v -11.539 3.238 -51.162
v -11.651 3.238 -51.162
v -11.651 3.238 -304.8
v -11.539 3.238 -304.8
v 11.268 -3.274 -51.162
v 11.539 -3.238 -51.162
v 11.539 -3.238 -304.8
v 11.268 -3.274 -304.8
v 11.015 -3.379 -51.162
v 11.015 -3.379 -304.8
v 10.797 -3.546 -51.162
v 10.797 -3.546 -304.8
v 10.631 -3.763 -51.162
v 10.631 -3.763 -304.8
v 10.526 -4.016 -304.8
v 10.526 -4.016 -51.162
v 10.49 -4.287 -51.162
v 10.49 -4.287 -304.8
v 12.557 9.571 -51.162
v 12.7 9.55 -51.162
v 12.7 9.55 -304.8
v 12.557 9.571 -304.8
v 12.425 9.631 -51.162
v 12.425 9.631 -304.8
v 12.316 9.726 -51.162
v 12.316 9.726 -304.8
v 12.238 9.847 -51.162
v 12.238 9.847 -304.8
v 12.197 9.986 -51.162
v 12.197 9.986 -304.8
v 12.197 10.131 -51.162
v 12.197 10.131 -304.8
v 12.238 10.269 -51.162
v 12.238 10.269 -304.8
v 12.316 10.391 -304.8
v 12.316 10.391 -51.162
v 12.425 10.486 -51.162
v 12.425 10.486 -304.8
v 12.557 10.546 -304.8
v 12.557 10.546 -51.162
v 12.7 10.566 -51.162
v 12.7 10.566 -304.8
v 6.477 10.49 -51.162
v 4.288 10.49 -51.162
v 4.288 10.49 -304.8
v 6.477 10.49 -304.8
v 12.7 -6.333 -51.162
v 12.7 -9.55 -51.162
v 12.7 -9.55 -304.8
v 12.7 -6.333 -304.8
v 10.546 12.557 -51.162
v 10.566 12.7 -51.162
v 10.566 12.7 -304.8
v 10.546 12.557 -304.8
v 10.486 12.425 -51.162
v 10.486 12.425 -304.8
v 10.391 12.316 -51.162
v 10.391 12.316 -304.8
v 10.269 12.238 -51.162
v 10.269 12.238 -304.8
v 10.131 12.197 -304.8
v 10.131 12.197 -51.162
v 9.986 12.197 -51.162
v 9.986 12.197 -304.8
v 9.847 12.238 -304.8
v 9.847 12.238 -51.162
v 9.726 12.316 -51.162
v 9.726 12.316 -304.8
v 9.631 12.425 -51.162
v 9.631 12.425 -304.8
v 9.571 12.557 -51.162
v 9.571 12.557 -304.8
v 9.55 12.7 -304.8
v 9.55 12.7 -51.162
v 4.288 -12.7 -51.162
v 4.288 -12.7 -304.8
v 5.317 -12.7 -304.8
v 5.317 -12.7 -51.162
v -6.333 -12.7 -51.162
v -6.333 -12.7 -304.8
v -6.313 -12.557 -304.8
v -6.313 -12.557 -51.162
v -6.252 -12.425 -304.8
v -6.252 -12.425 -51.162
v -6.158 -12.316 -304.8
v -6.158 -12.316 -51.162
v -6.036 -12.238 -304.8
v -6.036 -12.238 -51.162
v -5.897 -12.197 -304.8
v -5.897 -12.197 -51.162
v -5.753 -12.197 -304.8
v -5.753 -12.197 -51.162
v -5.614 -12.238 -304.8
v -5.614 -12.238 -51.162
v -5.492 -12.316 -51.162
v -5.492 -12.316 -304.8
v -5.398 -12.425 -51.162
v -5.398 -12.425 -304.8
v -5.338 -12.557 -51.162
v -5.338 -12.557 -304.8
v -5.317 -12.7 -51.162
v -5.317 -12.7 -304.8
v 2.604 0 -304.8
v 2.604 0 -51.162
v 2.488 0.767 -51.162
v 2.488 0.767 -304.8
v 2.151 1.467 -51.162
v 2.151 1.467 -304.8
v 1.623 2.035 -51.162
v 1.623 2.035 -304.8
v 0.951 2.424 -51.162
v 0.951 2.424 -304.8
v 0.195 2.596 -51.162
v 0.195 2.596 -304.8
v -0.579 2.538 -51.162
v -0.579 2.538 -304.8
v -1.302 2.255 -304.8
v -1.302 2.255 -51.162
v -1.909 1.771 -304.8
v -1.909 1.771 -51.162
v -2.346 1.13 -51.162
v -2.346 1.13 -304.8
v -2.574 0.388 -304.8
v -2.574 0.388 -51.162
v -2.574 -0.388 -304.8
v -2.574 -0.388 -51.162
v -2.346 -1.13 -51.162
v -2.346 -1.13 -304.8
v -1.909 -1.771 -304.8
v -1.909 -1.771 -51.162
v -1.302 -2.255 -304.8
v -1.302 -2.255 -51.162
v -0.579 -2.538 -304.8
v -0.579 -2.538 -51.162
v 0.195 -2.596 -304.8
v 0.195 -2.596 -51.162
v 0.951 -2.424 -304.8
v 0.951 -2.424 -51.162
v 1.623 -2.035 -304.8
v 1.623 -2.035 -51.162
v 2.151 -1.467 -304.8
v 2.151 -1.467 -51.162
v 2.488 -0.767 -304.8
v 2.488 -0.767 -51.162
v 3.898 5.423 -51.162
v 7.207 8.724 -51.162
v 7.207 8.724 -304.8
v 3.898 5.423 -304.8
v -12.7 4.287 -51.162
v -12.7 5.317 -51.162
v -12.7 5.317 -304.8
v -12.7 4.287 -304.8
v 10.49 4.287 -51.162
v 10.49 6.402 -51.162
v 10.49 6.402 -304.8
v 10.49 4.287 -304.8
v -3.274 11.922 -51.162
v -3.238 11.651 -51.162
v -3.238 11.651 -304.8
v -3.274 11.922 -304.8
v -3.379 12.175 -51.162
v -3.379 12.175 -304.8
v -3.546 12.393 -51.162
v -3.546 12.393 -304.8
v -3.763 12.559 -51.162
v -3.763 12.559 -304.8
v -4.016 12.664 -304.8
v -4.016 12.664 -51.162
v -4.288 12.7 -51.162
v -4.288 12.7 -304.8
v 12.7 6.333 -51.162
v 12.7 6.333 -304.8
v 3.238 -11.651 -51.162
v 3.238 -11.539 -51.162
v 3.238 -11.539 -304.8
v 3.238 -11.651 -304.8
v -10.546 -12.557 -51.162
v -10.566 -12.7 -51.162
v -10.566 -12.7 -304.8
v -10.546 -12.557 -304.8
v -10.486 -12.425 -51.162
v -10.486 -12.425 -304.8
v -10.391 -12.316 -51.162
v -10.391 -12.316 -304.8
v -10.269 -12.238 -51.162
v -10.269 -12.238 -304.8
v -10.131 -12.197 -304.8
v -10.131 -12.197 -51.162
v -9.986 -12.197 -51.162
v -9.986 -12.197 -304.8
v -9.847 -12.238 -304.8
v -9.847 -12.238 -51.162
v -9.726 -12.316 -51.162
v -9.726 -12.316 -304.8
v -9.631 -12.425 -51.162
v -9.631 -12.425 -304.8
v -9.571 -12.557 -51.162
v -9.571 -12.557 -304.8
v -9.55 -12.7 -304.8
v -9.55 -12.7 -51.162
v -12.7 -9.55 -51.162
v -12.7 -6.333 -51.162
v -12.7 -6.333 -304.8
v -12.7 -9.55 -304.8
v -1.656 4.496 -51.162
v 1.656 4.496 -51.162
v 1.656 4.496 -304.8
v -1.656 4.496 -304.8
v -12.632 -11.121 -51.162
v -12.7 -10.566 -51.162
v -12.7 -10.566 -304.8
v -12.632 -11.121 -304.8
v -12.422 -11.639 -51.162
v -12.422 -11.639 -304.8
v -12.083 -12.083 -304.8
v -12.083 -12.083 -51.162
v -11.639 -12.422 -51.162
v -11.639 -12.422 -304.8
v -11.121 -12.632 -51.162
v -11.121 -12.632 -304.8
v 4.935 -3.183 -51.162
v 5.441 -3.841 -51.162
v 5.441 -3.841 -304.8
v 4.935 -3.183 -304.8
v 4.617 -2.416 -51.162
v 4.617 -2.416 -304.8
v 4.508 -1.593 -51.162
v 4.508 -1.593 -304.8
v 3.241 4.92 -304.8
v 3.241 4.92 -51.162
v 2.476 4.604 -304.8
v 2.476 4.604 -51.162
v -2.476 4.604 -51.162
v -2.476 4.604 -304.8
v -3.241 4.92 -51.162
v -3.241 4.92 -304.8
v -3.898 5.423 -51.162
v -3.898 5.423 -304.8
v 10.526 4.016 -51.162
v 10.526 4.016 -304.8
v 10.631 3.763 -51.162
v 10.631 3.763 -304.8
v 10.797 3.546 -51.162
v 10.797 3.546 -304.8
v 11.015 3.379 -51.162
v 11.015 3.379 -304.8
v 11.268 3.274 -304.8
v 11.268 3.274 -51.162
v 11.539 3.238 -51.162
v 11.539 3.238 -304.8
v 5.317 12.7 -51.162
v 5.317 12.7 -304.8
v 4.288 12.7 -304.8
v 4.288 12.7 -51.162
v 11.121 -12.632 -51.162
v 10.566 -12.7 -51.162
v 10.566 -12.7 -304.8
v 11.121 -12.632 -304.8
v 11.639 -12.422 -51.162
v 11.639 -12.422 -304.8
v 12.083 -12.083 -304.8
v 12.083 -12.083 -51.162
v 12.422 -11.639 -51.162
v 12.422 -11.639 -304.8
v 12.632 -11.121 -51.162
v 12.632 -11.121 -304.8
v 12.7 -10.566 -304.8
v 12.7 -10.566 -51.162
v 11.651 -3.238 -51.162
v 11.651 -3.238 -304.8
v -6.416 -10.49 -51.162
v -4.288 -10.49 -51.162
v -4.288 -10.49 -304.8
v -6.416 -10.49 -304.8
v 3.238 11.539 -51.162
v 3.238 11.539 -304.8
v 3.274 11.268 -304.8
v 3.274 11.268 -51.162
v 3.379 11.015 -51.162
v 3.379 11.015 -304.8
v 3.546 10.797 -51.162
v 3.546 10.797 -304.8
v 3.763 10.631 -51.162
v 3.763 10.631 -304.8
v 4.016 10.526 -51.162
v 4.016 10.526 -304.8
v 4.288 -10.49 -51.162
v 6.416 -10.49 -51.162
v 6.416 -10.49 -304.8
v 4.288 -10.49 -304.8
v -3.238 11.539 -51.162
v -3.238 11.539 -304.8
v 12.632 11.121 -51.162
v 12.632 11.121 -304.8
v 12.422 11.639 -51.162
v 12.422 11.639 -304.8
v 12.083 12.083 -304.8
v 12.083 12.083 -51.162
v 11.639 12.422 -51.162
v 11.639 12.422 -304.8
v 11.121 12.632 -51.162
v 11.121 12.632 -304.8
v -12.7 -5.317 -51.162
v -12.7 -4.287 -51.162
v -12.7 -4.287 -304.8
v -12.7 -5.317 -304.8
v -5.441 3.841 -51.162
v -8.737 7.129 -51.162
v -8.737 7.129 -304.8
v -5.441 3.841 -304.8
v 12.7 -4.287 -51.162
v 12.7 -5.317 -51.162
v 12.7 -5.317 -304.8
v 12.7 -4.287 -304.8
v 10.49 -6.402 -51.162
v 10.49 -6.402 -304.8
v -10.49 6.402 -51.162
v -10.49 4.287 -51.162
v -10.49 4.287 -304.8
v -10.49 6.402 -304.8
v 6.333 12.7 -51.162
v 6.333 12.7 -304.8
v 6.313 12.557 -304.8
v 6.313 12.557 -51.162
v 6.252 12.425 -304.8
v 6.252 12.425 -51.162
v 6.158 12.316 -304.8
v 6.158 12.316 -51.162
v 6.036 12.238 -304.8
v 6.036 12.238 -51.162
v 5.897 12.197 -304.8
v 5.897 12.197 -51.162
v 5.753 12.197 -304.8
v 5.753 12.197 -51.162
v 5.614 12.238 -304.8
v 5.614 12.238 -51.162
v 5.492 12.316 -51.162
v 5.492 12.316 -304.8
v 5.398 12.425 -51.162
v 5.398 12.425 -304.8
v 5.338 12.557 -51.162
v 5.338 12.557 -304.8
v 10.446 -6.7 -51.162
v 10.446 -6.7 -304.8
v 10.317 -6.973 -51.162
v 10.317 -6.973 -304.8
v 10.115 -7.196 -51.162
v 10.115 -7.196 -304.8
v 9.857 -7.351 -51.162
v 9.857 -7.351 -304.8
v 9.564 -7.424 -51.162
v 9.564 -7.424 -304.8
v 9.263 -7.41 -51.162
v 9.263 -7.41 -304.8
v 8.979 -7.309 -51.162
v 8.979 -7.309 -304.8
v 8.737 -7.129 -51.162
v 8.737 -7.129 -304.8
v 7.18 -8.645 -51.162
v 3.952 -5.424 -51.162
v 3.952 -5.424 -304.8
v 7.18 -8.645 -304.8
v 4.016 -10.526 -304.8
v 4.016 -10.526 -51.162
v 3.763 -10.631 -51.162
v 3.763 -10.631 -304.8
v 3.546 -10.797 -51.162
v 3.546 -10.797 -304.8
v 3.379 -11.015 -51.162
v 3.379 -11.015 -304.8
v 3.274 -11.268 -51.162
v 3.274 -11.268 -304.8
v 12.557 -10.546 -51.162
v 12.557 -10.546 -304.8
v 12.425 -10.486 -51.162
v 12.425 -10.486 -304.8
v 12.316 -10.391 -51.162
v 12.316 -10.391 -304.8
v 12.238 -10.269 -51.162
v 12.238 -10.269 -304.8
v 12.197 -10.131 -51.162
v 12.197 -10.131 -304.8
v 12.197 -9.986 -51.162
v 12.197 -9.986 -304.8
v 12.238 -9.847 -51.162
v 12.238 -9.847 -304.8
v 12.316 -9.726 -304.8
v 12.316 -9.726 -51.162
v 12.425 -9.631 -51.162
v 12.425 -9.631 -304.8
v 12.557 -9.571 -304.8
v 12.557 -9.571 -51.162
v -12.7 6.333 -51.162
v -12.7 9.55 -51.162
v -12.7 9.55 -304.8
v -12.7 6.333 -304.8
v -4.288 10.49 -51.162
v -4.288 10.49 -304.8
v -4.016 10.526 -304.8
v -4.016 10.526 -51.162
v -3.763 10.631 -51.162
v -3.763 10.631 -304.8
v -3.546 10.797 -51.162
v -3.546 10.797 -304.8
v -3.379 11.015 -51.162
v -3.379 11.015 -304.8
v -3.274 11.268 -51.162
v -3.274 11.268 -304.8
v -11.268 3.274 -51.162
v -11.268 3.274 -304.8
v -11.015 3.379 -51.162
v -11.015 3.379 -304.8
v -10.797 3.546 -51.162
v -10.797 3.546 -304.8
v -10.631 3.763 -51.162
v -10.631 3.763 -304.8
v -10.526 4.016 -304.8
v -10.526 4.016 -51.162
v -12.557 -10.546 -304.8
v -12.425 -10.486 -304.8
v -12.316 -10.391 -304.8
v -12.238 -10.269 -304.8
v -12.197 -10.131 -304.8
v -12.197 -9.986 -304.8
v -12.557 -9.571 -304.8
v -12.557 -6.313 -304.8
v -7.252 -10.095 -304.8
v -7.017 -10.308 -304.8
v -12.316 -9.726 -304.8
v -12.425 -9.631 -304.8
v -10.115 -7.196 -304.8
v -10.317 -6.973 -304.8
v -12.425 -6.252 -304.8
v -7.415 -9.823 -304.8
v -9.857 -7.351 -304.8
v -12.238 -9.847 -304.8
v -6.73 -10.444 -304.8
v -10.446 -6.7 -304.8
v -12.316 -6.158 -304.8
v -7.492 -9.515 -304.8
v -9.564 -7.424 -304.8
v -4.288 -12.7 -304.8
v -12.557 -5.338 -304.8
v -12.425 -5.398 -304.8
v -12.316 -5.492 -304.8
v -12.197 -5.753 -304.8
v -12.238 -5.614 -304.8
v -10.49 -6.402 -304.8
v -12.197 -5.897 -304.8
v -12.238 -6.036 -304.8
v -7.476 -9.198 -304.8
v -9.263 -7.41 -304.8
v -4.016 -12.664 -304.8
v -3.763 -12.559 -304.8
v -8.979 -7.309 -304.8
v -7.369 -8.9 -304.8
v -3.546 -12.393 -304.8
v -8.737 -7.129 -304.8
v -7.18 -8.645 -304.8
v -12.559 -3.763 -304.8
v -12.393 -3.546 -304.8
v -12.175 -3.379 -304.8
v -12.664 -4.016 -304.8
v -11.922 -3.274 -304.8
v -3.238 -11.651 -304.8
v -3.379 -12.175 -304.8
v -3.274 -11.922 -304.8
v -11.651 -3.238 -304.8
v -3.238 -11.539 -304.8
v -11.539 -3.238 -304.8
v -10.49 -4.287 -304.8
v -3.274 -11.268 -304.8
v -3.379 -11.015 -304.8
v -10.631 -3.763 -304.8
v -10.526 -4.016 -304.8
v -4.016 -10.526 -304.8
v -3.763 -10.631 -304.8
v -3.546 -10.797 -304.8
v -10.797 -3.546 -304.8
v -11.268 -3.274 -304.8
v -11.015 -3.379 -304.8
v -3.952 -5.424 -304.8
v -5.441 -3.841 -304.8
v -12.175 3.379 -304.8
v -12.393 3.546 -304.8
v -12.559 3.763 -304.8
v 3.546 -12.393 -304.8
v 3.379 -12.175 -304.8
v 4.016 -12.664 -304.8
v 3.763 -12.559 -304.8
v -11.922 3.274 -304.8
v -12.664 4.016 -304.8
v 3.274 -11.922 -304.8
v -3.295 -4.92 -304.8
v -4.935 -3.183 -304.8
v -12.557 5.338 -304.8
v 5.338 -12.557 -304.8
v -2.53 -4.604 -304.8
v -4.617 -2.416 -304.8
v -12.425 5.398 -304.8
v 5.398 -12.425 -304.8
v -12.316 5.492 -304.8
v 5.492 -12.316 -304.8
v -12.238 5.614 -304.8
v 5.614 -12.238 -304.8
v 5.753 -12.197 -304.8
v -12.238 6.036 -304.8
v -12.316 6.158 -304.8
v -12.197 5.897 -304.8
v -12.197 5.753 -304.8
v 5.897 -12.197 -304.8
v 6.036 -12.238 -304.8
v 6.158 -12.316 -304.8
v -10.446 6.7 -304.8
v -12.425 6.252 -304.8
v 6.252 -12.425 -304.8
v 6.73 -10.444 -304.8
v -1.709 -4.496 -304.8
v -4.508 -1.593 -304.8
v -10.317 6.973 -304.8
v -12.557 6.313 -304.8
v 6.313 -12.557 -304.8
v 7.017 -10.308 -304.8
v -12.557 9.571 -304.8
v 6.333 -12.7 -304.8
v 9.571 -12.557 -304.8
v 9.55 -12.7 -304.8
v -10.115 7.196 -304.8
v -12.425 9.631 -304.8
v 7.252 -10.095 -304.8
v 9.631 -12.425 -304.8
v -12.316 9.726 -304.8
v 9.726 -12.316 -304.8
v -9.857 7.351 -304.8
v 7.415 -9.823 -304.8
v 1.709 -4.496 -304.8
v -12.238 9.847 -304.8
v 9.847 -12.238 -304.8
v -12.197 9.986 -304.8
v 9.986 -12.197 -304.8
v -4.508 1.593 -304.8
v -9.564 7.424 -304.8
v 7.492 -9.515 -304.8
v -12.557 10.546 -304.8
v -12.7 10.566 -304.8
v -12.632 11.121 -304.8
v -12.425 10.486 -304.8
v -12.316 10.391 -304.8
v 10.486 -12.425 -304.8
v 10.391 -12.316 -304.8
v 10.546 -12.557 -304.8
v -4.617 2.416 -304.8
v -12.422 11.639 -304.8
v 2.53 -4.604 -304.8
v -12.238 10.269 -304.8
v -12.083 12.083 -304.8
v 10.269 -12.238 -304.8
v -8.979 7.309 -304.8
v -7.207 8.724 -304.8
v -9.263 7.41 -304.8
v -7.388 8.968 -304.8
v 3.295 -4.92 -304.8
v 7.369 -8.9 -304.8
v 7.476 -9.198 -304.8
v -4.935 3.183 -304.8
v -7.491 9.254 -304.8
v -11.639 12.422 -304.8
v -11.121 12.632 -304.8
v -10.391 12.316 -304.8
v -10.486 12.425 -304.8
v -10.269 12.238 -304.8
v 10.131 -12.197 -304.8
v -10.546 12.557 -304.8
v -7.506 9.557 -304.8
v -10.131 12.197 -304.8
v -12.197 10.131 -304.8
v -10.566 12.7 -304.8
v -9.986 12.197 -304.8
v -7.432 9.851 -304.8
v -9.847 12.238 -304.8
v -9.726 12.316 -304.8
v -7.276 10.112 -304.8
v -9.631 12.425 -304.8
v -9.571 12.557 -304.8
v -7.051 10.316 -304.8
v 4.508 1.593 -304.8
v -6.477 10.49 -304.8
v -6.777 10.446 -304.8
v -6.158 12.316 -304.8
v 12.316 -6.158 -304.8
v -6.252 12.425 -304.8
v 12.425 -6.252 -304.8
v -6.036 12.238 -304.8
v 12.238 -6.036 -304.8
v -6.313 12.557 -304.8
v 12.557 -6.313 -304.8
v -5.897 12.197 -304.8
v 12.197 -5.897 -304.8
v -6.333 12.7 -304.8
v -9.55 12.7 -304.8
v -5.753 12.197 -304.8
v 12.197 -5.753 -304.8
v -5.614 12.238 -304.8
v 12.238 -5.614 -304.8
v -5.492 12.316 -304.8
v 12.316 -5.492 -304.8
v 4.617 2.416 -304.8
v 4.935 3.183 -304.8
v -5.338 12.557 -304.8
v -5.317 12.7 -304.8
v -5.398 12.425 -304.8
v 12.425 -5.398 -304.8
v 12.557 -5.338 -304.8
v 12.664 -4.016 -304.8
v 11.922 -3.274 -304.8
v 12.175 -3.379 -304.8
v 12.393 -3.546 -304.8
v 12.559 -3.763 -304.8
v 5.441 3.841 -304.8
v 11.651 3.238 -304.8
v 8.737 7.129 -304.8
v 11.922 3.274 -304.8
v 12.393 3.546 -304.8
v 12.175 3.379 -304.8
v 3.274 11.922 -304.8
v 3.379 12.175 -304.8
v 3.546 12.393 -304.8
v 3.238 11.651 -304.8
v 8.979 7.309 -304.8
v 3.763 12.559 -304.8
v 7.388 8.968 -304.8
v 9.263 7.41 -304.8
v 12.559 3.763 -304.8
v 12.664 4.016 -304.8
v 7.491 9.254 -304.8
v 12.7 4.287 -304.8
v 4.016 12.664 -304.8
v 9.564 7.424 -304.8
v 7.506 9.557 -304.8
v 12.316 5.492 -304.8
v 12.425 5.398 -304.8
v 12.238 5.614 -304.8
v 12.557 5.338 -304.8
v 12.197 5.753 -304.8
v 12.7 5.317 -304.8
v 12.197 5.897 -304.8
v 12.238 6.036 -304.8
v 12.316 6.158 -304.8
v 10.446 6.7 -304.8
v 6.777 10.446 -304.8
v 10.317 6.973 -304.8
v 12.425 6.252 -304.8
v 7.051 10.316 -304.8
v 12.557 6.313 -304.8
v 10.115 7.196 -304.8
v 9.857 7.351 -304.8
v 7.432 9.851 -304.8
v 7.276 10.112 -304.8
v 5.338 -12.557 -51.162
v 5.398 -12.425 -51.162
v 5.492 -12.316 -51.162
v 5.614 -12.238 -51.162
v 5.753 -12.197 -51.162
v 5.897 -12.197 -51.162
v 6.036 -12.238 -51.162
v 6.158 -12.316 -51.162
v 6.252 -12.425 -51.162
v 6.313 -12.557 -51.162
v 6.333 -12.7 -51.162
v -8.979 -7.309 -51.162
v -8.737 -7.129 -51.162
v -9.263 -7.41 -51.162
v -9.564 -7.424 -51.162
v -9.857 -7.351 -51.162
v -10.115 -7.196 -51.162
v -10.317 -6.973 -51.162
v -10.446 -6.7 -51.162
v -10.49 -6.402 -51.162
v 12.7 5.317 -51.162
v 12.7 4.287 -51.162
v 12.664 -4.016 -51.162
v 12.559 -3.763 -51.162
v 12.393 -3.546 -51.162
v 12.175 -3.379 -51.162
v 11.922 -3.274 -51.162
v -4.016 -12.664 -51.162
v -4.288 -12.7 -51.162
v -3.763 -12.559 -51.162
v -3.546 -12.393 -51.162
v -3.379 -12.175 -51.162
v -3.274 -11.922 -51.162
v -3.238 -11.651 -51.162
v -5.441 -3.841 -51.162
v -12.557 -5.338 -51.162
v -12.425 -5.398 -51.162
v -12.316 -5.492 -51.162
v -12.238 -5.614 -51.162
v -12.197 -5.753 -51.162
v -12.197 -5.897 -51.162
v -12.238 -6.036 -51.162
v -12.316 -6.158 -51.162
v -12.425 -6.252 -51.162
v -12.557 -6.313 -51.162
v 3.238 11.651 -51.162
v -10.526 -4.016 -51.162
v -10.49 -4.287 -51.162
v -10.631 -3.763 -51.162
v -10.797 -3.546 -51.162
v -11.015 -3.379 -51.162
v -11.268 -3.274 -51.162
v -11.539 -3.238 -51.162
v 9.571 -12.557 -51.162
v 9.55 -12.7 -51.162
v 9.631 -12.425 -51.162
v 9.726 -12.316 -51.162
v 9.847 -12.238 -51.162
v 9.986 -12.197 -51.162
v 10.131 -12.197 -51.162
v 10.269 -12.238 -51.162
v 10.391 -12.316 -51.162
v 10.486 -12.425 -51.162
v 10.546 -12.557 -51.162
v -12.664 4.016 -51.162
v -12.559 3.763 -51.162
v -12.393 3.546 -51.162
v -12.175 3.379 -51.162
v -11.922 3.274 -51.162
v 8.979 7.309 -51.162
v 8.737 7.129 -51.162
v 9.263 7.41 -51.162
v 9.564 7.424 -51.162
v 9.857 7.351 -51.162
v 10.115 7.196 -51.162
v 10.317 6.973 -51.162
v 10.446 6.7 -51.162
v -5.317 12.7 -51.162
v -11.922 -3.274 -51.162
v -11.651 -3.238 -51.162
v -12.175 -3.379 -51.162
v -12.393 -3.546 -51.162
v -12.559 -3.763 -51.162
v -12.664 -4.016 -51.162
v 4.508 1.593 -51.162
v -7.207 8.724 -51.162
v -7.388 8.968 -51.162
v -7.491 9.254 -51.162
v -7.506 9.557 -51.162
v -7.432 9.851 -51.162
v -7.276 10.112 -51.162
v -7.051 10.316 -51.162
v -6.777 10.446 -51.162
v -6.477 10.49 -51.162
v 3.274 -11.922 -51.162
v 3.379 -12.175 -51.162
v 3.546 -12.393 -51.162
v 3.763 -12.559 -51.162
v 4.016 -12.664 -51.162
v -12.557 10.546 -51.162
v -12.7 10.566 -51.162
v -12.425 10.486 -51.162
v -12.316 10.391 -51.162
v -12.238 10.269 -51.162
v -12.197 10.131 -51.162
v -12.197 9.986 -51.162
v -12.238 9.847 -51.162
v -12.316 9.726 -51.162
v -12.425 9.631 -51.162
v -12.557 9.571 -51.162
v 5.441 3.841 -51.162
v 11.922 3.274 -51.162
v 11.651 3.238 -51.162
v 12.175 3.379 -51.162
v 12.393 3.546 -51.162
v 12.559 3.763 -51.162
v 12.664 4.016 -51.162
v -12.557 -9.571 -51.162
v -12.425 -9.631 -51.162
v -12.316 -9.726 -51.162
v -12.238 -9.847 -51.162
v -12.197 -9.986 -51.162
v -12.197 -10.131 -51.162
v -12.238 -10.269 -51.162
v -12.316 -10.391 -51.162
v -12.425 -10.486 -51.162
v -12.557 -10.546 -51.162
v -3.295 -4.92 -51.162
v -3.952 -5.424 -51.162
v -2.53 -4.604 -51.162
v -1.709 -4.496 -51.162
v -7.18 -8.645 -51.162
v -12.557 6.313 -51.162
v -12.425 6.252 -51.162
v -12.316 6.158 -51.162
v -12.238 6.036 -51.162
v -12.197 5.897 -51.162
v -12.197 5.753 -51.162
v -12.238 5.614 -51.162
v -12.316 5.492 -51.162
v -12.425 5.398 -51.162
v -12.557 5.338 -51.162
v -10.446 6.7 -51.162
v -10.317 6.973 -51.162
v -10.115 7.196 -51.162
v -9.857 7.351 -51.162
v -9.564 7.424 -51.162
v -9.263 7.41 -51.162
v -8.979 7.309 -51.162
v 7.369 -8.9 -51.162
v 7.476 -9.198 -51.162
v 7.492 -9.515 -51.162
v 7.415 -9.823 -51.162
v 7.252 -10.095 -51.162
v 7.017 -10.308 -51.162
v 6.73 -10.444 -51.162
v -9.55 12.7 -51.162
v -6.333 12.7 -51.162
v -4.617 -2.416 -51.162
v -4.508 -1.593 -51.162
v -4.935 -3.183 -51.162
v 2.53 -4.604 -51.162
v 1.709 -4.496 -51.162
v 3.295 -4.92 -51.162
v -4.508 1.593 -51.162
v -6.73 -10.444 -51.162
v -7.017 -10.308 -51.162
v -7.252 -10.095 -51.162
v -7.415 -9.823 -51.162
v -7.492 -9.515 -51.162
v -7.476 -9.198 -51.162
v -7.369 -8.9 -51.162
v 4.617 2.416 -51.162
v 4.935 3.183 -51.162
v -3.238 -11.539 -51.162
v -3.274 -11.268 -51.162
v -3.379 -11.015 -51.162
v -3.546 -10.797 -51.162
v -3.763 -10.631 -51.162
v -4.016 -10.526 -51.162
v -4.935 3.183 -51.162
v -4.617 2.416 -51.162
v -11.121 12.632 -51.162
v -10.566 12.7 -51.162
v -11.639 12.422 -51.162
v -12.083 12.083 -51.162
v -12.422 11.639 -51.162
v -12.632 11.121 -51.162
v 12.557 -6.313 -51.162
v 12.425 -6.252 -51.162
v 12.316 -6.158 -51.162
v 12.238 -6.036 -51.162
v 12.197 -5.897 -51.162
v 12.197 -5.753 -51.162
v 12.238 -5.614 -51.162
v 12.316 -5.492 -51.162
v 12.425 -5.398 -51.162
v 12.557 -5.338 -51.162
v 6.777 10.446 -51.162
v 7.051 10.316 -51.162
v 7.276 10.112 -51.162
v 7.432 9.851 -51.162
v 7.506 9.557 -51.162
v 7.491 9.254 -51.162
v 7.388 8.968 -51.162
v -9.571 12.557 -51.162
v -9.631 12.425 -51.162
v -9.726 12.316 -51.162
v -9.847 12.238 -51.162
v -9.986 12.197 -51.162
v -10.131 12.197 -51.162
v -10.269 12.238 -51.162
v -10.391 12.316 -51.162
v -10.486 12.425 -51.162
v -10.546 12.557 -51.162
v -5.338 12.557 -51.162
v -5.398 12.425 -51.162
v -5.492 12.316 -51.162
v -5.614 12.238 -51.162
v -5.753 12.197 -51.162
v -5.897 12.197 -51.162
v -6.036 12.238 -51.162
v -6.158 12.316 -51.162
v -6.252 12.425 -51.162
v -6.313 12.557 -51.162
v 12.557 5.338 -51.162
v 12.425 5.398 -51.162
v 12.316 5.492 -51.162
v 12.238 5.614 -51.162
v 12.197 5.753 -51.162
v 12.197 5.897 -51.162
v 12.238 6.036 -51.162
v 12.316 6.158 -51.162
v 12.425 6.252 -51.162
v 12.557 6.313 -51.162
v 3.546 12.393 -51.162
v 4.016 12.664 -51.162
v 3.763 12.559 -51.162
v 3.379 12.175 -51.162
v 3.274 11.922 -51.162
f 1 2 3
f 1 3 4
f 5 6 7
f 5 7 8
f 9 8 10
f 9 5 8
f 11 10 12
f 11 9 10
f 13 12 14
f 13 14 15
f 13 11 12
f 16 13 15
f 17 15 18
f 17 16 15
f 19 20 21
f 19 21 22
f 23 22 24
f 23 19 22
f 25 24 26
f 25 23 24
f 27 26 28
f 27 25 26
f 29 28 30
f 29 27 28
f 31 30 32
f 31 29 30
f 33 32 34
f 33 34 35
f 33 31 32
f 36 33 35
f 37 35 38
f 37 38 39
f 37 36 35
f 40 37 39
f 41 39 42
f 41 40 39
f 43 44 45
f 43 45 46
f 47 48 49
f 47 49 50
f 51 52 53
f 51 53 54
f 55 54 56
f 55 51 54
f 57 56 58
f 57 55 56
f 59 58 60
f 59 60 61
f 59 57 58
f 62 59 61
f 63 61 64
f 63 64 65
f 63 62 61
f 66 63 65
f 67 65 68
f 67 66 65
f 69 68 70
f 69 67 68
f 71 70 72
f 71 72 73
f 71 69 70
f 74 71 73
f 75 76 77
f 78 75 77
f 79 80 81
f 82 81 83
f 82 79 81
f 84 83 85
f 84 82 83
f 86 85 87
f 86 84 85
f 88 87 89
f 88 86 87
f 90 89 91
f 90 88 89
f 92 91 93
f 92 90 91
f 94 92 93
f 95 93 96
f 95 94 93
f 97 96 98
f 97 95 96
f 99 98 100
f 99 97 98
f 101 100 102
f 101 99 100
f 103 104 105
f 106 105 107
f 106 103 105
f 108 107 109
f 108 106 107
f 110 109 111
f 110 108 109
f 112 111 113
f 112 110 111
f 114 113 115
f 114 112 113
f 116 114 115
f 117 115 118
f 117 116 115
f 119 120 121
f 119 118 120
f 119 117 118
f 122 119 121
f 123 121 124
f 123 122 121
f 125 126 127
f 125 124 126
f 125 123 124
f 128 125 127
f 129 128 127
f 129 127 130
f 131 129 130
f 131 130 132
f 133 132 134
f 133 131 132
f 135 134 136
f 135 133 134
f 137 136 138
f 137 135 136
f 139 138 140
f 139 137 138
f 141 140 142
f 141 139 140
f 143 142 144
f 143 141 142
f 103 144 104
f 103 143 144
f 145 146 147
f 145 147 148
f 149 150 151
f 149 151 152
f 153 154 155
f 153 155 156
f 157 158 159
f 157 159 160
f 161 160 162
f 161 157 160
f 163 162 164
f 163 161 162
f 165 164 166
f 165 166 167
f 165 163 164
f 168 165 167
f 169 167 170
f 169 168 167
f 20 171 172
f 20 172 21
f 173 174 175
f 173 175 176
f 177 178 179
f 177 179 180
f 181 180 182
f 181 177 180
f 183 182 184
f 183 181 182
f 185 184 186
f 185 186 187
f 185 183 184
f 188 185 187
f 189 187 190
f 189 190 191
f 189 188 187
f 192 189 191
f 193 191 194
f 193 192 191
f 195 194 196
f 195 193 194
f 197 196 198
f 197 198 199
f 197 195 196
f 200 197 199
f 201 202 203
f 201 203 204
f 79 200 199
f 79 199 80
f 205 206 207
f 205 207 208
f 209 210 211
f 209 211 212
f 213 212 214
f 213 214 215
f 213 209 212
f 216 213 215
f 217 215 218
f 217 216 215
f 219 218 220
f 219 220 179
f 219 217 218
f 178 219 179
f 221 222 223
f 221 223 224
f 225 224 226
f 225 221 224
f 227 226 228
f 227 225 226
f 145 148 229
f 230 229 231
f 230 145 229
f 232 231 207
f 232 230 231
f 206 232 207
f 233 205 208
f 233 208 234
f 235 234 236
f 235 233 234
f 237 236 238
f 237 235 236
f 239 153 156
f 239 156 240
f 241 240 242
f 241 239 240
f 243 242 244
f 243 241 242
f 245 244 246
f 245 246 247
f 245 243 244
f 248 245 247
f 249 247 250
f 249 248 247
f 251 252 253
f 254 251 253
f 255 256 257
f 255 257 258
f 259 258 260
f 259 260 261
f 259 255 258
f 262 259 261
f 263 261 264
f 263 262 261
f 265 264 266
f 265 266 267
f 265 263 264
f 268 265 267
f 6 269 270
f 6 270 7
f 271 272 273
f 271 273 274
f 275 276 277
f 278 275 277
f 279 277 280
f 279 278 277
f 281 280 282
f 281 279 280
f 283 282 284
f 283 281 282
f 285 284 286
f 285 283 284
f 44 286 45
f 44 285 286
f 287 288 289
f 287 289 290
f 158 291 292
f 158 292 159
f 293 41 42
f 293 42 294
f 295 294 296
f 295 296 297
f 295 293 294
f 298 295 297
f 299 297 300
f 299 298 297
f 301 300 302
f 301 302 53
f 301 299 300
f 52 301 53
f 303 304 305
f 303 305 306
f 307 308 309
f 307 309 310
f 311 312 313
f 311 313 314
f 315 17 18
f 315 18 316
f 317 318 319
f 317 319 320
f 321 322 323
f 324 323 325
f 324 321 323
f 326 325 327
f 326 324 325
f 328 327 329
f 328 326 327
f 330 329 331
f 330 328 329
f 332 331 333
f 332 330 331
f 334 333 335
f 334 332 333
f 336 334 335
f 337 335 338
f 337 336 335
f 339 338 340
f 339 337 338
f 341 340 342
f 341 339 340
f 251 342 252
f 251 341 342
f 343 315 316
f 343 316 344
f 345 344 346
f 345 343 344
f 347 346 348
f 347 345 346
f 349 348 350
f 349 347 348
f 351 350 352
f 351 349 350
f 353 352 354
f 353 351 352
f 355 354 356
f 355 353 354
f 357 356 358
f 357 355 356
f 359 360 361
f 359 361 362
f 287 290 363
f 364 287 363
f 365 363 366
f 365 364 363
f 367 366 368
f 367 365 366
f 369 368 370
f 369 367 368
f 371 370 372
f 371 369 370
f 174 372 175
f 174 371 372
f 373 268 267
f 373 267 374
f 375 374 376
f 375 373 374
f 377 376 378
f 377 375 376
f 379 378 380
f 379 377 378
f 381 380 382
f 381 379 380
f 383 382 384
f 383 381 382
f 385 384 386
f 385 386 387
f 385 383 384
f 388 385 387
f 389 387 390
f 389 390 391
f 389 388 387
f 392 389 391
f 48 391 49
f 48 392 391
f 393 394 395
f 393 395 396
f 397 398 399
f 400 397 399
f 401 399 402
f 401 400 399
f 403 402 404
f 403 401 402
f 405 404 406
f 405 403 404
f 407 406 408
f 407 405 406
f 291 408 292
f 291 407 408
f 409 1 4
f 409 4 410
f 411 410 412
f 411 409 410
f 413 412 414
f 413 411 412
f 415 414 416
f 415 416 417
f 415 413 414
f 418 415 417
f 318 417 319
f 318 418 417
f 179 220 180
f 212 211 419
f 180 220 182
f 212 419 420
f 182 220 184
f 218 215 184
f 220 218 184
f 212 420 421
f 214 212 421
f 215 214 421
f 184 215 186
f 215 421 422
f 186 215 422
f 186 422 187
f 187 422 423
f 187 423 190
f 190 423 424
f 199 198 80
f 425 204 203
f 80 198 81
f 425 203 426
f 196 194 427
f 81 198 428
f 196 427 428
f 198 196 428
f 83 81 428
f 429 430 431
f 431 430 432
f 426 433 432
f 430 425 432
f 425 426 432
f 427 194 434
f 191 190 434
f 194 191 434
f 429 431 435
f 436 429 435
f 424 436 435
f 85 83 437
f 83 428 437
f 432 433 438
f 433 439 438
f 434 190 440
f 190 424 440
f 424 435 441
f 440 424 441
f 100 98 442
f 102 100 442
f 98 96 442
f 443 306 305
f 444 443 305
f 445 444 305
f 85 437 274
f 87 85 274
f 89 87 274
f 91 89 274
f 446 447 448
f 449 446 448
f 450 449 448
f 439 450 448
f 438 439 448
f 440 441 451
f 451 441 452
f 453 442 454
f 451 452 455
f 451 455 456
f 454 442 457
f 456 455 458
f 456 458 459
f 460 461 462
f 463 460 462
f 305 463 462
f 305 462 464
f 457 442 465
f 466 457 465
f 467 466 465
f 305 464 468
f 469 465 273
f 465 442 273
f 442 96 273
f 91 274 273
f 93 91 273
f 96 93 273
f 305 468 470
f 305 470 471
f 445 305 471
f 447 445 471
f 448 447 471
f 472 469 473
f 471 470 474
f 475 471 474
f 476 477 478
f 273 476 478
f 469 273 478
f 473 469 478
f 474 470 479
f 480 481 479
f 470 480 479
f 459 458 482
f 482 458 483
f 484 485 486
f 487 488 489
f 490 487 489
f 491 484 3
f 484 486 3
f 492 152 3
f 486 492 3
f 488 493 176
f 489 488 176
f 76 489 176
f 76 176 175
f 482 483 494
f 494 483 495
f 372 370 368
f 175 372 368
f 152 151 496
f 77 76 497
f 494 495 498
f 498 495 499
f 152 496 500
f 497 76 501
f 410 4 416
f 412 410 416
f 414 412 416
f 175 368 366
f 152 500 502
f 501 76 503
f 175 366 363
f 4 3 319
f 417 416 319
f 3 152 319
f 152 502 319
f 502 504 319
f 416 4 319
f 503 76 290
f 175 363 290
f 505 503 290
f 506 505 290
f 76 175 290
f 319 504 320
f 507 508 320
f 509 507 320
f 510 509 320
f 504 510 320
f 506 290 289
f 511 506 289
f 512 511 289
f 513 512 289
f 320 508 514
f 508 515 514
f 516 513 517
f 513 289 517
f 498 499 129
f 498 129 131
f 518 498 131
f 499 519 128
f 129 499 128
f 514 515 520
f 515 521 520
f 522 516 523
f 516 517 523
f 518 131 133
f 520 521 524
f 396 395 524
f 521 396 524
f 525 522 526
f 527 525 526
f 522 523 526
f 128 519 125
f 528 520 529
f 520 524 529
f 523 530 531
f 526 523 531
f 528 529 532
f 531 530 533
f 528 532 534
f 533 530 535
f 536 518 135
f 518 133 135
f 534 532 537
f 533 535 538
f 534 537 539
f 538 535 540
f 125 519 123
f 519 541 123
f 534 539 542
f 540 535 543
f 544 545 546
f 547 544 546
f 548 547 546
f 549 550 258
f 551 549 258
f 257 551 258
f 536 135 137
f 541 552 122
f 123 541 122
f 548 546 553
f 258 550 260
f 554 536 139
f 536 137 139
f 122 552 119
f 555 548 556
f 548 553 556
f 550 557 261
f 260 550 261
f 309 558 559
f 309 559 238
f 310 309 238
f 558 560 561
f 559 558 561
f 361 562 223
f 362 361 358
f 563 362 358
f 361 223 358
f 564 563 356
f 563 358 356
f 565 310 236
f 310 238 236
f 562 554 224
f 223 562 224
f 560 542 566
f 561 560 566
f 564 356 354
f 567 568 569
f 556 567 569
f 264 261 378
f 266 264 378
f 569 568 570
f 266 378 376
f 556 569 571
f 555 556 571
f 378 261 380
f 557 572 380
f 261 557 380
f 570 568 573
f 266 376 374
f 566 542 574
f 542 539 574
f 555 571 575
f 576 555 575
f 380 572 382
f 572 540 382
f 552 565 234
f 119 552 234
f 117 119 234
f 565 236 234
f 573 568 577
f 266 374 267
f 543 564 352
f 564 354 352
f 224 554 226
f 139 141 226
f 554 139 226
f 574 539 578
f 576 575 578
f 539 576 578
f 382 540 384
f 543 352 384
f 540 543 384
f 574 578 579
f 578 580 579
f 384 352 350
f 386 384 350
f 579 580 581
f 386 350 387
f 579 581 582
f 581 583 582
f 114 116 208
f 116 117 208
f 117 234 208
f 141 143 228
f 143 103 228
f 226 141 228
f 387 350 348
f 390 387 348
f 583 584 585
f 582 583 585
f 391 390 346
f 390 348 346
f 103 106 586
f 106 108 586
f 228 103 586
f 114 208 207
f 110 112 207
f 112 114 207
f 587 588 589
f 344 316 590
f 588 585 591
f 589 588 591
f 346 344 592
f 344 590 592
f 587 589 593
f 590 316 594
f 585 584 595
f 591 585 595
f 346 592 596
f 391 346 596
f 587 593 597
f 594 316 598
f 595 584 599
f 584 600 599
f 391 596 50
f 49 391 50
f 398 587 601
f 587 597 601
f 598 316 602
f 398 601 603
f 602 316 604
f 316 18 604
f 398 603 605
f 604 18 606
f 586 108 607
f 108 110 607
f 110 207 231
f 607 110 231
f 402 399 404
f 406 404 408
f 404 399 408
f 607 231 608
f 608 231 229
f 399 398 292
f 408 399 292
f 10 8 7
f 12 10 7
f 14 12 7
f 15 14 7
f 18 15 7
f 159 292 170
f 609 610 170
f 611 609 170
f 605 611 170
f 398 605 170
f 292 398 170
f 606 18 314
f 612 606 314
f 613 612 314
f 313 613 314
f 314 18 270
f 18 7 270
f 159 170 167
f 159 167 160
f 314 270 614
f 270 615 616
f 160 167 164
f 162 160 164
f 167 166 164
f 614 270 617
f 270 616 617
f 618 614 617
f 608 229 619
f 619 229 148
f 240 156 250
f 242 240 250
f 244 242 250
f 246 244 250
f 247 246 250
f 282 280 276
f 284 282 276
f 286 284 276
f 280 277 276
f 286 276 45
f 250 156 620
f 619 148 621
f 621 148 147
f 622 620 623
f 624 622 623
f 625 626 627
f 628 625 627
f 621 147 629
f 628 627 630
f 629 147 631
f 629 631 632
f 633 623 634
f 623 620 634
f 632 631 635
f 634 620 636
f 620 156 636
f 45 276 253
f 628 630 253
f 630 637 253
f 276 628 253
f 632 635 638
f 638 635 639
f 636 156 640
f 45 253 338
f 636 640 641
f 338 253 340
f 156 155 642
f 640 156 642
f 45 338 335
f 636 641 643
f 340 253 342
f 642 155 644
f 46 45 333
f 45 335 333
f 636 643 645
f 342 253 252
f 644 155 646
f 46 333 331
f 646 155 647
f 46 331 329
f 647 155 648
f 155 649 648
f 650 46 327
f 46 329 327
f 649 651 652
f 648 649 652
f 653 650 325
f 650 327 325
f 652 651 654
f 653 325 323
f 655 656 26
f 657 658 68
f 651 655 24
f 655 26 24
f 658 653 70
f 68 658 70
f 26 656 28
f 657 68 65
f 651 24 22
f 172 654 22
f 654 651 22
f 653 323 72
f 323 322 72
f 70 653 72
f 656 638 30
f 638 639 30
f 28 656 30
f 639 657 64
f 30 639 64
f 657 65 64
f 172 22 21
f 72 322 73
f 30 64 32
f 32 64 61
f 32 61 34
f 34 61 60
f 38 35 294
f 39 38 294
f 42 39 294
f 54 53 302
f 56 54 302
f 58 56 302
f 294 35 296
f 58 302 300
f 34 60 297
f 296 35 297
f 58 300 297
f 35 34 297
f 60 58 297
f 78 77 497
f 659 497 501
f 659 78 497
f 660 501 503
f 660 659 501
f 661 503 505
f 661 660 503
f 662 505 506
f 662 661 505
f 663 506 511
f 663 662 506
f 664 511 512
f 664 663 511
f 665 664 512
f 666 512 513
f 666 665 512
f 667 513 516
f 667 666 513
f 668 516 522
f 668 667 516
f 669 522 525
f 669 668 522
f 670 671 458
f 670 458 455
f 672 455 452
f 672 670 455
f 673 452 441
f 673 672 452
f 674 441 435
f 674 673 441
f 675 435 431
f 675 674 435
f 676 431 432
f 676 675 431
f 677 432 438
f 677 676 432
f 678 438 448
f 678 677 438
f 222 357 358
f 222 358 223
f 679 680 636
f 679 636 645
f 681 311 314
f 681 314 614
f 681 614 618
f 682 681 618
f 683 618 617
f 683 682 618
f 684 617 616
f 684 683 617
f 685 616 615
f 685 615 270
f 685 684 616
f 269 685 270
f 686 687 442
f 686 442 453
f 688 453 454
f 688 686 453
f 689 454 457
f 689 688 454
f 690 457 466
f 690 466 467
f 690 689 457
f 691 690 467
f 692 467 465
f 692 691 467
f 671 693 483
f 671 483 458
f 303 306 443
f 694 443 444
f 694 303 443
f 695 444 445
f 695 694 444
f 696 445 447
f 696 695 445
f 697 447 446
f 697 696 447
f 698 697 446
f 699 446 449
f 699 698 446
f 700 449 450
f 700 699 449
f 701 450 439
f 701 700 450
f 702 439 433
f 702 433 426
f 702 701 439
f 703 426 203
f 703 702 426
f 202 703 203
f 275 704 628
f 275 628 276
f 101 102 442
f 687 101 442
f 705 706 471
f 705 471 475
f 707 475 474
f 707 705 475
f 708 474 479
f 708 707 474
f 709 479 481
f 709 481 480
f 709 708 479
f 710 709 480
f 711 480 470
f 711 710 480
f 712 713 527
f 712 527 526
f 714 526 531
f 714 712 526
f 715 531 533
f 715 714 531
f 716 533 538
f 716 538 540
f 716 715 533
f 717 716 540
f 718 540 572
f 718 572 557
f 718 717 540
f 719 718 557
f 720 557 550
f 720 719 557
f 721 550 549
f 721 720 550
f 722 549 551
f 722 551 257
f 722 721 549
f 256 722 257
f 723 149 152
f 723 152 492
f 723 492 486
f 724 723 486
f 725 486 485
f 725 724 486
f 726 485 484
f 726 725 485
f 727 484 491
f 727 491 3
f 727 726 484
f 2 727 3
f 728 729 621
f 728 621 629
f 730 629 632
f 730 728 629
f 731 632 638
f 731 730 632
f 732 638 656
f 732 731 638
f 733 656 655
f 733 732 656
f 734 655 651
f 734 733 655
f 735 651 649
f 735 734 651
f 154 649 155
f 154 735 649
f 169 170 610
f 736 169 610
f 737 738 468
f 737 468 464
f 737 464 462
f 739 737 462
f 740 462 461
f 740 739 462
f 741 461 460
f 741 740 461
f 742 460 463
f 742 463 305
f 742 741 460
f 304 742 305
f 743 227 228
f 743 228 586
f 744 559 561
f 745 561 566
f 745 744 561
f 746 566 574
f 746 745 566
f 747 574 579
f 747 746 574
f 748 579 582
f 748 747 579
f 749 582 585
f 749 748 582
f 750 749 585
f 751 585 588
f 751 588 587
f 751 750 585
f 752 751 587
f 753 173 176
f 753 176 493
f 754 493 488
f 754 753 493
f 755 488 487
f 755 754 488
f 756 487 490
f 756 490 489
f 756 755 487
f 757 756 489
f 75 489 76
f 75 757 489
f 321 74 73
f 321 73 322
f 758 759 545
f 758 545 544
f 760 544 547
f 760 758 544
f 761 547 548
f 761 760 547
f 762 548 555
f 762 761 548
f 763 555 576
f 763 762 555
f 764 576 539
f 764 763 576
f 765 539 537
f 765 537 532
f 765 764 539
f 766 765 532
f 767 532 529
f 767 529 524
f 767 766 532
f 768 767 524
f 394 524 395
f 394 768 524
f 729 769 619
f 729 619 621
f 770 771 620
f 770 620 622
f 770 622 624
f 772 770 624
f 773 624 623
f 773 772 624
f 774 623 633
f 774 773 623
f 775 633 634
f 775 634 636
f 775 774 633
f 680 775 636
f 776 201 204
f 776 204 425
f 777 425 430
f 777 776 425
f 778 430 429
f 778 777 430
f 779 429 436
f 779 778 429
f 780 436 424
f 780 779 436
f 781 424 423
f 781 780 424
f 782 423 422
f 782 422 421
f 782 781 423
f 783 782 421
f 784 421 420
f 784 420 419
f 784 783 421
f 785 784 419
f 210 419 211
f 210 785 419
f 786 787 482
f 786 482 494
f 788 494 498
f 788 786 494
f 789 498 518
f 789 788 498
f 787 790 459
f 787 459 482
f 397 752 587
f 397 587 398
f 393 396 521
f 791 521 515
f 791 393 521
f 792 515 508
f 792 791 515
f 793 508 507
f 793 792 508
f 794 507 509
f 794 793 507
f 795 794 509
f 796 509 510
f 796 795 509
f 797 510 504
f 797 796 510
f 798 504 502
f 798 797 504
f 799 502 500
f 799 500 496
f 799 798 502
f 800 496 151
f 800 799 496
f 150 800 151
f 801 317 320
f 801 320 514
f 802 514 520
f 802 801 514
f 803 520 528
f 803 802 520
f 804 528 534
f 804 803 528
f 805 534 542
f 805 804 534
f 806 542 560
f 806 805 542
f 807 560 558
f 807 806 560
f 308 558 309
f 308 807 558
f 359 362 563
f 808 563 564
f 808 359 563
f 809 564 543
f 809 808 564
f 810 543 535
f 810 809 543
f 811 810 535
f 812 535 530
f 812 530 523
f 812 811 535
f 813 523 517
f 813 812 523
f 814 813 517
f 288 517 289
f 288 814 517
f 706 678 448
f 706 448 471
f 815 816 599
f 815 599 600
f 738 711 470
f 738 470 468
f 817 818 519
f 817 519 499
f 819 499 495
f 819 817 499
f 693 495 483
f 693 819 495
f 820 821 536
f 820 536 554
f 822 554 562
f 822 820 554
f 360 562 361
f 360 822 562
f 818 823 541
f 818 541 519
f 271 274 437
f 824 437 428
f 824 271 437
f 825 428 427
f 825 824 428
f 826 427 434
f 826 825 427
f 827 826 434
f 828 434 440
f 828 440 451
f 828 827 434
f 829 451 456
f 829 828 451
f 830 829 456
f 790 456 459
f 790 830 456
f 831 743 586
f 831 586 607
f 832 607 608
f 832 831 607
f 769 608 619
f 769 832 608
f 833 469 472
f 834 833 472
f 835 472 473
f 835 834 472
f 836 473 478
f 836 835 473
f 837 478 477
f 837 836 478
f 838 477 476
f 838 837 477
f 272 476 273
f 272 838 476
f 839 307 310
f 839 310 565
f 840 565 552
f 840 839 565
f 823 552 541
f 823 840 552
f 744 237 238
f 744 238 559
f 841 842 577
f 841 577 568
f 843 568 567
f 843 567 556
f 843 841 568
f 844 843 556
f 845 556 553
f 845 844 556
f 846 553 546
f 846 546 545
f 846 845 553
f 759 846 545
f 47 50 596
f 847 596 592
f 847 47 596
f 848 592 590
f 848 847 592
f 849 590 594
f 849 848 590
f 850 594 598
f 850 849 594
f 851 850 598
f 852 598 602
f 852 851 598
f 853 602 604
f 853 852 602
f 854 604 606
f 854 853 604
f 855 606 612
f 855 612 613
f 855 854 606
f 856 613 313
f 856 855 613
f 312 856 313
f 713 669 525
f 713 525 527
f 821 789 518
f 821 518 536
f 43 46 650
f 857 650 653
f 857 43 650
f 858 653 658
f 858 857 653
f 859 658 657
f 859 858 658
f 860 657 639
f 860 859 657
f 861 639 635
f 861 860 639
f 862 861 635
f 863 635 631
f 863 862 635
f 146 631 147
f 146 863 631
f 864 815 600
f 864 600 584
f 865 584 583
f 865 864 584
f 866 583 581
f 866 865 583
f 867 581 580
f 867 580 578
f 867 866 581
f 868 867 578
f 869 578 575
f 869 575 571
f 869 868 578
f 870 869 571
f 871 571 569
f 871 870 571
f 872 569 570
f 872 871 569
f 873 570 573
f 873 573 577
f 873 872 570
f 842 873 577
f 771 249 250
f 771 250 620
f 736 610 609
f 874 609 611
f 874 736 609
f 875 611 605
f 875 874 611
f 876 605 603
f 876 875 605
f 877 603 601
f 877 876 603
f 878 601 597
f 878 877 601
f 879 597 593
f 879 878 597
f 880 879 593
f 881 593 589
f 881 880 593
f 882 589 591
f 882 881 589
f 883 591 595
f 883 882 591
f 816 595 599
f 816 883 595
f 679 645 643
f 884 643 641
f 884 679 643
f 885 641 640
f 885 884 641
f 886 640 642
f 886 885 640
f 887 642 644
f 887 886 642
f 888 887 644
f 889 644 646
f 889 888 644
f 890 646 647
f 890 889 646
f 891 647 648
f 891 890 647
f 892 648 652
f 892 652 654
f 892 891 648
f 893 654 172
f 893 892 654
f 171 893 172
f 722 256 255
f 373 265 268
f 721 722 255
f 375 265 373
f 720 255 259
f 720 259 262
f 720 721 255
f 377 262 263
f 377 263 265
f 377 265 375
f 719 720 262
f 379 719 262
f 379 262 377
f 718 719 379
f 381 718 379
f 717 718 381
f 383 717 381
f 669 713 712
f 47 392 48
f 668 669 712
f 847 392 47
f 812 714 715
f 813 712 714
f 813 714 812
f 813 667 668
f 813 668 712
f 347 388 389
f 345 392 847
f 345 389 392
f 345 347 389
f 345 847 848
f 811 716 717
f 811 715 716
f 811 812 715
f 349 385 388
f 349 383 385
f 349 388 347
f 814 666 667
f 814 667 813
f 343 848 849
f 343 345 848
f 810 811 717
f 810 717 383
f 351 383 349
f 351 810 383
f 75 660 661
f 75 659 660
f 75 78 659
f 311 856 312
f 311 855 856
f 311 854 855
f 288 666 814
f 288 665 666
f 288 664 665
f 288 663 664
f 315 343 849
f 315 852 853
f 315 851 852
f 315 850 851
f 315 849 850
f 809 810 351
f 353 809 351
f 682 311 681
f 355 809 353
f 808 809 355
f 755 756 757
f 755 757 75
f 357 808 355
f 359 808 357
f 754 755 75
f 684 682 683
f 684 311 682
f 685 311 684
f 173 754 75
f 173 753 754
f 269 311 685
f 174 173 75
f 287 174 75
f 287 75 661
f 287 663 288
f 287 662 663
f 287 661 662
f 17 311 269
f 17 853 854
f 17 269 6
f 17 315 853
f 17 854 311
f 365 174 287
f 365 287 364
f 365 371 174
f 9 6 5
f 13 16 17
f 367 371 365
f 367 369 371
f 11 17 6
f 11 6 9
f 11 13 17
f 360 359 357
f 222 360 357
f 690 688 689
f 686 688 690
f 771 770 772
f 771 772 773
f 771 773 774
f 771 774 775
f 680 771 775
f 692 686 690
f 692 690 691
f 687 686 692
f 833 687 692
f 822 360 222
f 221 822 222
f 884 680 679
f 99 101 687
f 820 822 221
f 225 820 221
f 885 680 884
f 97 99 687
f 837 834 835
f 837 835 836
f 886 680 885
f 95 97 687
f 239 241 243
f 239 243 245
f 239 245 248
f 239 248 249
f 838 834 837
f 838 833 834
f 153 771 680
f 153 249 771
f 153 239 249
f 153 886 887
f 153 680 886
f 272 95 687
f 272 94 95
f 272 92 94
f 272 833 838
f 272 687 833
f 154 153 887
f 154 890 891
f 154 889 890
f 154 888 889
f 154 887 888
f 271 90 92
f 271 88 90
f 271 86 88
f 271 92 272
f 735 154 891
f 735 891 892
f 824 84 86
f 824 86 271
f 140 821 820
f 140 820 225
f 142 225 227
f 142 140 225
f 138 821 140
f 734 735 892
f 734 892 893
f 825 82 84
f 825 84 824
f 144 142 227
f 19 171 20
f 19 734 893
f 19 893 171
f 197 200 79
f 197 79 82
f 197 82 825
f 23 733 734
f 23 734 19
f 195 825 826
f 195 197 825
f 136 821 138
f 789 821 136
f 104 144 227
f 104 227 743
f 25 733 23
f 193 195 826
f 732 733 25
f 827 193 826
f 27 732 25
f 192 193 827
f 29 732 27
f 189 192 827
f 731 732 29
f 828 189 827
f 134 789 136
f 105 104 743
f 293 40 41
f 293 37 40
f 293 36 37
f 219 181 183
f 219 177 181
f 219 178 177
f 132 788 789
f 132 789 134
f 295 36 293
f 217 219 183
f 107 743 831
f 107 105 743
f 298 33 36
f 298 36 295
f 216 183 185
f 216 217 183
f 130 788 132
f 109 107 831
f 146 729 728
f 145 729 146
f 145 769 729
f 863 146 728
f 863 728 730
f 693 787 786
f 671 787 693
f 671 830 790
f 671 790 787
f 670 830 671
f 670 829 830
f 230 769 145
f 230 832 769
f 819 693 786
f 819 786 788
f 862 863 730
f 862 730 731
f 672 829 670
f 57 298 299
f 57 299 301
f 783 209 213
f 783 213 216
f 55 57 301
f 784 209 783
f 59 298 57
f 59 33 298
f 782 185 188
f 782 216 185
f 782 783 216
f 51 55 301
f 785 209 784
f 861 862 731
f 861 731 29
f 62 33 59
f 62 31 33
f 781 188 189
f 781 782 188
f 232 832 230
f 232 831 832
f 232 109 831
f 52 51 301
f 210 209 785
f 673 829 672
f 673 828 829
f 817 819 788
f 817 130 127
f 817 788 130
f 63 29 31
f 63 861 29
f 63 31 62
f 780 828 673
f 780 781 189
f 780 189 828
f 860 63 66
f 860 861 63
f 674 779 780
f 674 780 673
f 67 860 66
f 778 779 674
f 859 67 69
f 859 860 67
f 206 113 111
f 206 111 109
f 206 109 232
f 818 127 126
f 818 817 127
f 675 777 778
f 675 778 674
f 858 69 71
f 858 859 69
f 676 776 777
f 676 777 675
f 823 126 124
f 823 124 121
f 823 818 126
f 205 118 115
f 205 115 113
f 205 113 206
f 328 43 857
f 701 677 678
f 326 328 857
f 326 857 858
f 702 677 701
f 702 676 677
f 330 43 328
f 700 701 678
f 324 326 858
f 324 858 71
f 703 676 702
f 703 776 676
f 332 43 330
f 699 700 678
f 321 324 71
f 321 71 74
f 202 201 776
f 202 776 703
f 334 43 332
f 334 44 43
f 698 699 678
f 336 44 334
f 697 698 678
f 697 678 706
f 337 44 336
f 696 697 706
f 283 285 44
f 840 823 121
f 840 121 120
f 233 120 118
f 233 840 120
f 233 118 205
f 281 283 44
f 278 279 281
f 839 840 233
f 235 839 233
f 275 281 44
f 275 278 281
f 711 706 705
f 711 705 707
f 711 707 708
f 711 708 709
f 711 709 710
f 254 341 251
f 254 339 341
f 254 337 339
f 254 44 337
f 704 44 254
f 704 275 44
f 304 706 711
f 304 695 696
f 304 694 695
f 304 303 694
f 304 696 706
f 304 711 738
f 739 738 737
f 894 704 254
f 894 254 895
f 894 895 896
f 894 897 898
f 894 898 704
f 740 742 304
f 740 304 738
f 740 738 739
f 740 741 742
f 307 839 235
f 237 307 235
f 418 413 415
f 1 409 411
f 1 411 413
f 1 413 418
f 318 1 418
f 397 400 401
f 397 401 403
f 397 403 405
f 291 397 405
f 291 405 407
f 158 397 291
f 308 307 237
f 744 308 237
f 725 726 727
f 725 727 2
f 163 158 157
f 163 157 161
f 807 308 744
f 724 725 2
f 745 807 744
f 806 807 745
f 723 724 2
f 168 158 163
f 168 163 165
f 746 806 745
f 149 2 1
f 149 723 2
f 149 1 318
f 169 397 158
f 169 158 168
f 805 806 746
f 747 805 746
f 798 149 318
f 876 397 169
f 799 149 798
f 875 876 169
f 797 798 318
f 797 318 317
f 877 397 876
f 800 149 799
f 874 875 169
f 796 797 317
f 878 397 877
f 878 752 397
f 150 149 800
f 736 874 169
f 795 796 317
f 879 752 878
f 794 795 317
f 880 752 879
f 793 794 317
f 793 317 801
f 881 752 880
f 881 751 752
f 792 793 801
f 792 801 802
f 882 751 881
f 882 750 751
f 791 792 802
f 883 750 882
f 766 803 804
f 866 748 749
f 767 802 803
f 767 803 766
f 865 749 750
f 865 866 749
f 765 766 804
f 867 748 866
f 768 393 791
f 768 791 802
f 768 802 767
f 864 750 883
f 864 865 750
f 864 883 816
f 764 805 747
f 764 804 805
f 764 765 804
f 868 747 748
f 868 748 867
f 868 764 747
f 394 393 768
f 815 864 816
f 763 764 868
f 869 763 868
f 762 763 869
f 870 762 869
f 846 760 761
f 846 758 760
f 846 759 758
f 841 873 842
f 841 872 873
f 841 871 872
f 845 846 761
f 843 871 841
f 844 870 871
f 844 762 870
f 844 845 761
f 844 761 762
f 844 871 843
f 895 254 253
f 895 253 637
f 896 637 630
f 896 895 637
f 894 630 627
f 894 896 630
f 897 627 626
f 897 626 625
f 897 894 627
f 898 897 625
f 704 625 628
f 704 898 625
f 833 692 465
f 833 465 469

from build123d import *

# Parameters (mm, degrees)
SKETCH1_R               = 2.6035
BOSS_EXTRUDE1_DEPTH     = 304.8
SKETCH2_W               = 358.370469457
SKETCH2_H               = 29.886329236
CUT_EXTRUDE1_DEPTH      = 2.794
CUT_EXTRUDE1_DEPTH_BACK = 29.464


with BuildPart() as part:
    # Sketch1 → Boss-Extrude1 (new body, symmetric)
    with BuildSketch(Plane.XY):
        with BuildLine():
            Line((-7.179650497, -8.645192506), (-3.952270251, -5.423690499))
            ThreePointArc((-3.952270251, -5.423690499), (-2.922936451, -4.736929036), (-1.709253557, -4.4958))
            Line((-1.709253557, -4.4958), (1.709253557, -4.4958))
            ThreePointArc((1.709253557, -4.4958), (2.922936451, -4.736929036), (3.952270251, -5.423690499))
            Line((3.952270251, -5.423690499), (7.179650497, -8.645192506))
            ThreePointArc((7.179650497, -8.645192506), (7.41473083, -9.822813117), (6.416408329, -10.4902))
            Line((6.416408329, -10.4902), (4.287512407, -10.4902))
            ThreePointArc((4.287512407, -10.4902), (3.54574862, -10.79744862), (3.2385, -11.539212407))
            Line((3.2385, -11.539212407), (3.2385, -11.650987593))
            ThreePointArc((3.2385, -11.650987593), (3.54574862, -12.39275138), (4.287512407, -12.7))
            Line((4.287512407, -12.7), (5.317126718, -12.7))
            ThreePointArc((5.317126718, -12.7), (5.825126718, -12.192), (6.333126718, -12.7))
            Line((6.333126718, -12.7), (9.550443118, -12.7))
            ThreePointArc((9.550443118, -12.7), (10.058366869, -12.192000006), (10.566443095, -12.699847501))
            ThreePointArc((10.566443095, -12.699847501), (12.082537762, -12.08250727), (12.699846982, -10.566399977))
            ThreePointArc((12.699846982, -10.566399977), (12.192000006, -10.058323491), (12.7, -9.5504))
            Line((12.7, -9.5504), (12.7, -6.3330836))
            ThreePointArc((12.7, -6.3330836), (12.192, -5.8250836), (12.7, -5.3170836))
            Line((12.7, -5.3170836), (12.7, -4.287469289))
            ThreePointArc((12.7, -4.287469289), (12.39275138, -3.545705502), (11.650987593, -3.238456882))
            Line((11.650987593, -3.238456882), (11.539212407, -3.238456882))
            ThreePointArc((11.539212407, -3.238456882), (10.79744862, -3.545705502), (10.4902, -4.287469289))
            Line((10.4902, -4.287469289), (10.4902, -6.402089023))
            ThreePointArc((10.4902, -6.402089023), (9.856505071, -7.351067942), (8.737131347, -7.129408934))
            Line((8.737131347, -7.129408934), (5.441005833, -3.840816462))
            ThreePointArc((5.441005833, -3.840816462), (4.750877967, -2.809883091), (4.5085, -1.593185507))
            Line((4.5085, -1.593185507), (4.5085, 1.593185507))
            ThreePointArc((4.5085, 1.593185507), (4.750877967, 2.809883091), (5.441005833, 3.840816462))
            Line((5.441005833, 3.840816462), (8.737131347, 7.129408934))
            ThreePointArc((8.737131347, 7.129408934), (9.856505071, 7.351067942), (10.4902, 6.402089023))
            Line((10.4902, 6.402089023), (10.4902, 4.287469289))
            ThreePointArc((10.4902, 4.287469289), (10.79744862, 3.545705502), (11.539212407, 3.238456882))
            Line((11.539212407, 3.238456882), (11.650987593, 3.238456882))
            ThreePointArc((11.650987593, 3.238456882), (12.39275138, 3.545705502), (12.7, 4.287469289))
            Line((12.7, 4.287469289), (12.7, 5.3170836))
            ThreePointArc((12.7, 5.3170836), (12.192, 5.8250836), (12.7, 6.3330836))
            Line((12.7, 6.3330836), (12.7, 9.5504))
            ThreePointArc((12.7, 9.5504), (12.192000006, 10.058323491), (12.699846982, 10.566399977))
            ThreePointArc((12.699846982, 10.566399977), (12.082537762, 12.08250727), (10.566443095, 12.699847501))
            ThreePointArc((10.566443095, 12.699847501), (10.058366869, 12.192000006), (9.550443118, 12.7))
            Line((9.550443118, 12.7), (6.333126718, 12.7))
            ThreePointArc((6.333126718, 12.7), (5.825126718, 12.192), (5.317126718, 12.7))
            Line((5.317126718, 12.7), (4.287512407, 12.7))
            ThreePointArc((4.287512407, 12.7), (3.54574862, 12.39275138), (3.2385, 11.650987593))
            Line((3.2385, 11.650987593), (3.2385, 11.539212407))
            ThreePointArc((3.2385, 11.539212407), (3.54574862, 10.79744862), (4.287512407, 10.4902))
            Line((4.287512407, 10.4902), (6.476788598, 10.4902))
            ThreePointArc((6.476788598, 10.4902), (7.432222385, 9.85140422), (7.207036008, 8.724370562))
            Line((7.207036008, 8.724370562), (3.898272566, 5.423169045))
            ThreePointArc((3.898272566, 5.423169045), (2.869120213, 4.736787962), (1.655778399, 4.4958))
            Line((1.655778399, 4.4958), (-1.655778399, 4.4958))
            ThreePointArc((-1.655778399, 4.4958), (-2.869120213, 4.736787962), (-3.898272566, 5.423169045))
            Line((-3.898272566, 5.423169045), (-7.207036008, 8.724370562))
            ThreePointArc((-7.207036008, 8.724370562), (-7.432222385, 9.85140422), (-6.476788598, 10.4902))
            Line((-6.476788598, 10.4902), (-4.287512407, 10.4902))
            ThreePointArc((-4.287512407, 10.4902), (-3.54574862, 10.79744862), (-3.2385, 11.539212407))
            Line((-3.2385, 11.539212407), (-3.2385, 11.650987593))
            ThreePointArc((-3.2385, 11.650987593), (-3.54574862, 12.39275138), (-4.287512407, 12.7))
            Line((-4.287512407, 12.7), (-5.317126718, 12.7))
            ThreePointArc((-5.317126718, 12.7), (-5.825126718, 12.192), (-6.333126718, 12.7))
            Line((-6.333126718, 12.7), (-9.550443118, 12.7))
            ThreePointArc((-9.550443118, 12.7), (-10.058366869, 12.192000006), (-10.566443095, 12.699847501))
            ThreePointArc((-10.566443095, 12.699847501), (-12.082537762, 12.08250727), (-12.699846982, 10.566399977))
            ThreePointArc((-12.699846982, 10.566399977), (-12.192000006, 10.058323491), (-12.7, 9.5504))
            Line((-12.7, 9.5504), (-12.7, 6.3330836))
            ThreePointArc((-12.7, 6.3330836), (-12.192, 5.8250836), (-12.7, 5.3170836))
            Line((-12.7, 5.3170836), (-12.7, 4.287469289))
            ThreePointArc((-12.7, 4.287469289), (-12.39275138, 3.545705502), (-11.650987593, 3.238456882))
            Line((-11.650987593, 3.238456882), (-11.539212407, 3.238456882))
            ThreePointArc((-11.539212407, 3.238456882), (-10.79744862, 3.545705502), (-10.4902, 4.287469289))
            Line((-10.4902, 4.287469289), (-10.4902, 6.402089023))
            ThreePointArc((-10.4902, 6.402089023), (-9.856505071, 7.351067942), (-8.737131347, 7.129408934))
            Line((-8.737131347, 7.129408934), (-5.441005833, 3.840816462))
            ThreePointArc((-5.441005833, 3.840816462), (-4.750877967, 2.809883091), (-4.5085, 1.593185507))
            Line((-4.5085, 1.593185507), (-4.5085, -1.593185507))
            ThreePointArc((-4.5085, -1.593185507), (-4.750877967, -2.809883091), (-5.441005833, -3.840816462))
            Line((-5.441005833, -3.840816462), (-8.737131347, -7.129408934))
            ThreePointArc((-8.737131347, -7.129408934), (-9.856505071, -7.351067942), (-10.4902, -6.402089023))
            Line((-10.4902, -6.402089023), (-10.4902, -4.287469289))
            ThreePointArc((-10.4902, -4.287469289), (-10.79744862, -3.545705502), (-11.539212407, -3.238456882))
            Line((-11.539212407, -3.238456882), (-11.650987593, -3.238456882))
            ThreePointArc((-11.650987593, -3.238456882), (-12.39275138, -3.545705502), (-12.7, -4.287469289))
            Line((-12.7, -4.287469289), (-12.7, -5.3170836))
            ThreePointArc((-12.7, -5.3170836), (-12.192, -5.8250836), (-12.7, -6.3330836))
            Line((-12.7, -6.3330836), (-12.7, -9.5504))
            ThreePointArc((-12.7, -9.5504), (-12.192000006, -10.058323491), (-12.699846982, -10.566399977))
            ThreePointArc((-12.699846982, -10.566399977), (-12.082537762, -12.08250727), (-10.566443095, -12.699847501))
            ThreePointArc((-10.566443095, -12.699847501), (-10.058366869, -12.192000006), (-9.550443118, -12.7))
            Line((-9.550443118, -12.7), (-6.333126718, -12.7))
            ThreePointArc((-6.333126718, -12.7), (-5.825126718, -12.192), (-5.317126718, -12.7))
            Line((-5.317126718, -12.7), (-4.287512407, -12.7))
            ThreePointArc((-4.287512407, -12.7), (-3.54574862, -12.39275138), (-3.2385, -11.650987593))
            Line((-3.2385, -11.650987593), (-3.2385, -11.539212407))
            ThreePointArc((-3.2385, -11.539212407), (-3.54574862, -10.79744862), (-4.287512407, -10.4902))
            Line((-4.287512407, -10.4902), (-6.416408329, -10.4902))
            ThreePointArc((-6.416408329, -10.4902), (-7.41473083, -9.822813117), (-7.179650497, -8.645192506))
        make_face()
        Circle(SKETCH1_R, mode=Mode.SUBTRACT)
    extrude(amount=BOSS_EXTRUDE1_DEPTH, both=True)

    # Sketch2 → Cut-Extrude1 (cut, two sides)
    with BuildSketch(Plane.ZY.offset(12.7)) as cut_extrude1_sk:
        with Locations((128.022864135, 0.284213822)):
            Rectangle(SKETCH2_W, SKETCH2_H)
    extrude(amount=CUT_EXTRUDE1_DEPTH, mode=Mode.SUBTRACT)
    extrude(cut_extrude1_sk.sketch, amount=-CUT_EXTRUDE1_DEPTH_BACK, mode=Mode.SUBTRACT)


solid = part.part
